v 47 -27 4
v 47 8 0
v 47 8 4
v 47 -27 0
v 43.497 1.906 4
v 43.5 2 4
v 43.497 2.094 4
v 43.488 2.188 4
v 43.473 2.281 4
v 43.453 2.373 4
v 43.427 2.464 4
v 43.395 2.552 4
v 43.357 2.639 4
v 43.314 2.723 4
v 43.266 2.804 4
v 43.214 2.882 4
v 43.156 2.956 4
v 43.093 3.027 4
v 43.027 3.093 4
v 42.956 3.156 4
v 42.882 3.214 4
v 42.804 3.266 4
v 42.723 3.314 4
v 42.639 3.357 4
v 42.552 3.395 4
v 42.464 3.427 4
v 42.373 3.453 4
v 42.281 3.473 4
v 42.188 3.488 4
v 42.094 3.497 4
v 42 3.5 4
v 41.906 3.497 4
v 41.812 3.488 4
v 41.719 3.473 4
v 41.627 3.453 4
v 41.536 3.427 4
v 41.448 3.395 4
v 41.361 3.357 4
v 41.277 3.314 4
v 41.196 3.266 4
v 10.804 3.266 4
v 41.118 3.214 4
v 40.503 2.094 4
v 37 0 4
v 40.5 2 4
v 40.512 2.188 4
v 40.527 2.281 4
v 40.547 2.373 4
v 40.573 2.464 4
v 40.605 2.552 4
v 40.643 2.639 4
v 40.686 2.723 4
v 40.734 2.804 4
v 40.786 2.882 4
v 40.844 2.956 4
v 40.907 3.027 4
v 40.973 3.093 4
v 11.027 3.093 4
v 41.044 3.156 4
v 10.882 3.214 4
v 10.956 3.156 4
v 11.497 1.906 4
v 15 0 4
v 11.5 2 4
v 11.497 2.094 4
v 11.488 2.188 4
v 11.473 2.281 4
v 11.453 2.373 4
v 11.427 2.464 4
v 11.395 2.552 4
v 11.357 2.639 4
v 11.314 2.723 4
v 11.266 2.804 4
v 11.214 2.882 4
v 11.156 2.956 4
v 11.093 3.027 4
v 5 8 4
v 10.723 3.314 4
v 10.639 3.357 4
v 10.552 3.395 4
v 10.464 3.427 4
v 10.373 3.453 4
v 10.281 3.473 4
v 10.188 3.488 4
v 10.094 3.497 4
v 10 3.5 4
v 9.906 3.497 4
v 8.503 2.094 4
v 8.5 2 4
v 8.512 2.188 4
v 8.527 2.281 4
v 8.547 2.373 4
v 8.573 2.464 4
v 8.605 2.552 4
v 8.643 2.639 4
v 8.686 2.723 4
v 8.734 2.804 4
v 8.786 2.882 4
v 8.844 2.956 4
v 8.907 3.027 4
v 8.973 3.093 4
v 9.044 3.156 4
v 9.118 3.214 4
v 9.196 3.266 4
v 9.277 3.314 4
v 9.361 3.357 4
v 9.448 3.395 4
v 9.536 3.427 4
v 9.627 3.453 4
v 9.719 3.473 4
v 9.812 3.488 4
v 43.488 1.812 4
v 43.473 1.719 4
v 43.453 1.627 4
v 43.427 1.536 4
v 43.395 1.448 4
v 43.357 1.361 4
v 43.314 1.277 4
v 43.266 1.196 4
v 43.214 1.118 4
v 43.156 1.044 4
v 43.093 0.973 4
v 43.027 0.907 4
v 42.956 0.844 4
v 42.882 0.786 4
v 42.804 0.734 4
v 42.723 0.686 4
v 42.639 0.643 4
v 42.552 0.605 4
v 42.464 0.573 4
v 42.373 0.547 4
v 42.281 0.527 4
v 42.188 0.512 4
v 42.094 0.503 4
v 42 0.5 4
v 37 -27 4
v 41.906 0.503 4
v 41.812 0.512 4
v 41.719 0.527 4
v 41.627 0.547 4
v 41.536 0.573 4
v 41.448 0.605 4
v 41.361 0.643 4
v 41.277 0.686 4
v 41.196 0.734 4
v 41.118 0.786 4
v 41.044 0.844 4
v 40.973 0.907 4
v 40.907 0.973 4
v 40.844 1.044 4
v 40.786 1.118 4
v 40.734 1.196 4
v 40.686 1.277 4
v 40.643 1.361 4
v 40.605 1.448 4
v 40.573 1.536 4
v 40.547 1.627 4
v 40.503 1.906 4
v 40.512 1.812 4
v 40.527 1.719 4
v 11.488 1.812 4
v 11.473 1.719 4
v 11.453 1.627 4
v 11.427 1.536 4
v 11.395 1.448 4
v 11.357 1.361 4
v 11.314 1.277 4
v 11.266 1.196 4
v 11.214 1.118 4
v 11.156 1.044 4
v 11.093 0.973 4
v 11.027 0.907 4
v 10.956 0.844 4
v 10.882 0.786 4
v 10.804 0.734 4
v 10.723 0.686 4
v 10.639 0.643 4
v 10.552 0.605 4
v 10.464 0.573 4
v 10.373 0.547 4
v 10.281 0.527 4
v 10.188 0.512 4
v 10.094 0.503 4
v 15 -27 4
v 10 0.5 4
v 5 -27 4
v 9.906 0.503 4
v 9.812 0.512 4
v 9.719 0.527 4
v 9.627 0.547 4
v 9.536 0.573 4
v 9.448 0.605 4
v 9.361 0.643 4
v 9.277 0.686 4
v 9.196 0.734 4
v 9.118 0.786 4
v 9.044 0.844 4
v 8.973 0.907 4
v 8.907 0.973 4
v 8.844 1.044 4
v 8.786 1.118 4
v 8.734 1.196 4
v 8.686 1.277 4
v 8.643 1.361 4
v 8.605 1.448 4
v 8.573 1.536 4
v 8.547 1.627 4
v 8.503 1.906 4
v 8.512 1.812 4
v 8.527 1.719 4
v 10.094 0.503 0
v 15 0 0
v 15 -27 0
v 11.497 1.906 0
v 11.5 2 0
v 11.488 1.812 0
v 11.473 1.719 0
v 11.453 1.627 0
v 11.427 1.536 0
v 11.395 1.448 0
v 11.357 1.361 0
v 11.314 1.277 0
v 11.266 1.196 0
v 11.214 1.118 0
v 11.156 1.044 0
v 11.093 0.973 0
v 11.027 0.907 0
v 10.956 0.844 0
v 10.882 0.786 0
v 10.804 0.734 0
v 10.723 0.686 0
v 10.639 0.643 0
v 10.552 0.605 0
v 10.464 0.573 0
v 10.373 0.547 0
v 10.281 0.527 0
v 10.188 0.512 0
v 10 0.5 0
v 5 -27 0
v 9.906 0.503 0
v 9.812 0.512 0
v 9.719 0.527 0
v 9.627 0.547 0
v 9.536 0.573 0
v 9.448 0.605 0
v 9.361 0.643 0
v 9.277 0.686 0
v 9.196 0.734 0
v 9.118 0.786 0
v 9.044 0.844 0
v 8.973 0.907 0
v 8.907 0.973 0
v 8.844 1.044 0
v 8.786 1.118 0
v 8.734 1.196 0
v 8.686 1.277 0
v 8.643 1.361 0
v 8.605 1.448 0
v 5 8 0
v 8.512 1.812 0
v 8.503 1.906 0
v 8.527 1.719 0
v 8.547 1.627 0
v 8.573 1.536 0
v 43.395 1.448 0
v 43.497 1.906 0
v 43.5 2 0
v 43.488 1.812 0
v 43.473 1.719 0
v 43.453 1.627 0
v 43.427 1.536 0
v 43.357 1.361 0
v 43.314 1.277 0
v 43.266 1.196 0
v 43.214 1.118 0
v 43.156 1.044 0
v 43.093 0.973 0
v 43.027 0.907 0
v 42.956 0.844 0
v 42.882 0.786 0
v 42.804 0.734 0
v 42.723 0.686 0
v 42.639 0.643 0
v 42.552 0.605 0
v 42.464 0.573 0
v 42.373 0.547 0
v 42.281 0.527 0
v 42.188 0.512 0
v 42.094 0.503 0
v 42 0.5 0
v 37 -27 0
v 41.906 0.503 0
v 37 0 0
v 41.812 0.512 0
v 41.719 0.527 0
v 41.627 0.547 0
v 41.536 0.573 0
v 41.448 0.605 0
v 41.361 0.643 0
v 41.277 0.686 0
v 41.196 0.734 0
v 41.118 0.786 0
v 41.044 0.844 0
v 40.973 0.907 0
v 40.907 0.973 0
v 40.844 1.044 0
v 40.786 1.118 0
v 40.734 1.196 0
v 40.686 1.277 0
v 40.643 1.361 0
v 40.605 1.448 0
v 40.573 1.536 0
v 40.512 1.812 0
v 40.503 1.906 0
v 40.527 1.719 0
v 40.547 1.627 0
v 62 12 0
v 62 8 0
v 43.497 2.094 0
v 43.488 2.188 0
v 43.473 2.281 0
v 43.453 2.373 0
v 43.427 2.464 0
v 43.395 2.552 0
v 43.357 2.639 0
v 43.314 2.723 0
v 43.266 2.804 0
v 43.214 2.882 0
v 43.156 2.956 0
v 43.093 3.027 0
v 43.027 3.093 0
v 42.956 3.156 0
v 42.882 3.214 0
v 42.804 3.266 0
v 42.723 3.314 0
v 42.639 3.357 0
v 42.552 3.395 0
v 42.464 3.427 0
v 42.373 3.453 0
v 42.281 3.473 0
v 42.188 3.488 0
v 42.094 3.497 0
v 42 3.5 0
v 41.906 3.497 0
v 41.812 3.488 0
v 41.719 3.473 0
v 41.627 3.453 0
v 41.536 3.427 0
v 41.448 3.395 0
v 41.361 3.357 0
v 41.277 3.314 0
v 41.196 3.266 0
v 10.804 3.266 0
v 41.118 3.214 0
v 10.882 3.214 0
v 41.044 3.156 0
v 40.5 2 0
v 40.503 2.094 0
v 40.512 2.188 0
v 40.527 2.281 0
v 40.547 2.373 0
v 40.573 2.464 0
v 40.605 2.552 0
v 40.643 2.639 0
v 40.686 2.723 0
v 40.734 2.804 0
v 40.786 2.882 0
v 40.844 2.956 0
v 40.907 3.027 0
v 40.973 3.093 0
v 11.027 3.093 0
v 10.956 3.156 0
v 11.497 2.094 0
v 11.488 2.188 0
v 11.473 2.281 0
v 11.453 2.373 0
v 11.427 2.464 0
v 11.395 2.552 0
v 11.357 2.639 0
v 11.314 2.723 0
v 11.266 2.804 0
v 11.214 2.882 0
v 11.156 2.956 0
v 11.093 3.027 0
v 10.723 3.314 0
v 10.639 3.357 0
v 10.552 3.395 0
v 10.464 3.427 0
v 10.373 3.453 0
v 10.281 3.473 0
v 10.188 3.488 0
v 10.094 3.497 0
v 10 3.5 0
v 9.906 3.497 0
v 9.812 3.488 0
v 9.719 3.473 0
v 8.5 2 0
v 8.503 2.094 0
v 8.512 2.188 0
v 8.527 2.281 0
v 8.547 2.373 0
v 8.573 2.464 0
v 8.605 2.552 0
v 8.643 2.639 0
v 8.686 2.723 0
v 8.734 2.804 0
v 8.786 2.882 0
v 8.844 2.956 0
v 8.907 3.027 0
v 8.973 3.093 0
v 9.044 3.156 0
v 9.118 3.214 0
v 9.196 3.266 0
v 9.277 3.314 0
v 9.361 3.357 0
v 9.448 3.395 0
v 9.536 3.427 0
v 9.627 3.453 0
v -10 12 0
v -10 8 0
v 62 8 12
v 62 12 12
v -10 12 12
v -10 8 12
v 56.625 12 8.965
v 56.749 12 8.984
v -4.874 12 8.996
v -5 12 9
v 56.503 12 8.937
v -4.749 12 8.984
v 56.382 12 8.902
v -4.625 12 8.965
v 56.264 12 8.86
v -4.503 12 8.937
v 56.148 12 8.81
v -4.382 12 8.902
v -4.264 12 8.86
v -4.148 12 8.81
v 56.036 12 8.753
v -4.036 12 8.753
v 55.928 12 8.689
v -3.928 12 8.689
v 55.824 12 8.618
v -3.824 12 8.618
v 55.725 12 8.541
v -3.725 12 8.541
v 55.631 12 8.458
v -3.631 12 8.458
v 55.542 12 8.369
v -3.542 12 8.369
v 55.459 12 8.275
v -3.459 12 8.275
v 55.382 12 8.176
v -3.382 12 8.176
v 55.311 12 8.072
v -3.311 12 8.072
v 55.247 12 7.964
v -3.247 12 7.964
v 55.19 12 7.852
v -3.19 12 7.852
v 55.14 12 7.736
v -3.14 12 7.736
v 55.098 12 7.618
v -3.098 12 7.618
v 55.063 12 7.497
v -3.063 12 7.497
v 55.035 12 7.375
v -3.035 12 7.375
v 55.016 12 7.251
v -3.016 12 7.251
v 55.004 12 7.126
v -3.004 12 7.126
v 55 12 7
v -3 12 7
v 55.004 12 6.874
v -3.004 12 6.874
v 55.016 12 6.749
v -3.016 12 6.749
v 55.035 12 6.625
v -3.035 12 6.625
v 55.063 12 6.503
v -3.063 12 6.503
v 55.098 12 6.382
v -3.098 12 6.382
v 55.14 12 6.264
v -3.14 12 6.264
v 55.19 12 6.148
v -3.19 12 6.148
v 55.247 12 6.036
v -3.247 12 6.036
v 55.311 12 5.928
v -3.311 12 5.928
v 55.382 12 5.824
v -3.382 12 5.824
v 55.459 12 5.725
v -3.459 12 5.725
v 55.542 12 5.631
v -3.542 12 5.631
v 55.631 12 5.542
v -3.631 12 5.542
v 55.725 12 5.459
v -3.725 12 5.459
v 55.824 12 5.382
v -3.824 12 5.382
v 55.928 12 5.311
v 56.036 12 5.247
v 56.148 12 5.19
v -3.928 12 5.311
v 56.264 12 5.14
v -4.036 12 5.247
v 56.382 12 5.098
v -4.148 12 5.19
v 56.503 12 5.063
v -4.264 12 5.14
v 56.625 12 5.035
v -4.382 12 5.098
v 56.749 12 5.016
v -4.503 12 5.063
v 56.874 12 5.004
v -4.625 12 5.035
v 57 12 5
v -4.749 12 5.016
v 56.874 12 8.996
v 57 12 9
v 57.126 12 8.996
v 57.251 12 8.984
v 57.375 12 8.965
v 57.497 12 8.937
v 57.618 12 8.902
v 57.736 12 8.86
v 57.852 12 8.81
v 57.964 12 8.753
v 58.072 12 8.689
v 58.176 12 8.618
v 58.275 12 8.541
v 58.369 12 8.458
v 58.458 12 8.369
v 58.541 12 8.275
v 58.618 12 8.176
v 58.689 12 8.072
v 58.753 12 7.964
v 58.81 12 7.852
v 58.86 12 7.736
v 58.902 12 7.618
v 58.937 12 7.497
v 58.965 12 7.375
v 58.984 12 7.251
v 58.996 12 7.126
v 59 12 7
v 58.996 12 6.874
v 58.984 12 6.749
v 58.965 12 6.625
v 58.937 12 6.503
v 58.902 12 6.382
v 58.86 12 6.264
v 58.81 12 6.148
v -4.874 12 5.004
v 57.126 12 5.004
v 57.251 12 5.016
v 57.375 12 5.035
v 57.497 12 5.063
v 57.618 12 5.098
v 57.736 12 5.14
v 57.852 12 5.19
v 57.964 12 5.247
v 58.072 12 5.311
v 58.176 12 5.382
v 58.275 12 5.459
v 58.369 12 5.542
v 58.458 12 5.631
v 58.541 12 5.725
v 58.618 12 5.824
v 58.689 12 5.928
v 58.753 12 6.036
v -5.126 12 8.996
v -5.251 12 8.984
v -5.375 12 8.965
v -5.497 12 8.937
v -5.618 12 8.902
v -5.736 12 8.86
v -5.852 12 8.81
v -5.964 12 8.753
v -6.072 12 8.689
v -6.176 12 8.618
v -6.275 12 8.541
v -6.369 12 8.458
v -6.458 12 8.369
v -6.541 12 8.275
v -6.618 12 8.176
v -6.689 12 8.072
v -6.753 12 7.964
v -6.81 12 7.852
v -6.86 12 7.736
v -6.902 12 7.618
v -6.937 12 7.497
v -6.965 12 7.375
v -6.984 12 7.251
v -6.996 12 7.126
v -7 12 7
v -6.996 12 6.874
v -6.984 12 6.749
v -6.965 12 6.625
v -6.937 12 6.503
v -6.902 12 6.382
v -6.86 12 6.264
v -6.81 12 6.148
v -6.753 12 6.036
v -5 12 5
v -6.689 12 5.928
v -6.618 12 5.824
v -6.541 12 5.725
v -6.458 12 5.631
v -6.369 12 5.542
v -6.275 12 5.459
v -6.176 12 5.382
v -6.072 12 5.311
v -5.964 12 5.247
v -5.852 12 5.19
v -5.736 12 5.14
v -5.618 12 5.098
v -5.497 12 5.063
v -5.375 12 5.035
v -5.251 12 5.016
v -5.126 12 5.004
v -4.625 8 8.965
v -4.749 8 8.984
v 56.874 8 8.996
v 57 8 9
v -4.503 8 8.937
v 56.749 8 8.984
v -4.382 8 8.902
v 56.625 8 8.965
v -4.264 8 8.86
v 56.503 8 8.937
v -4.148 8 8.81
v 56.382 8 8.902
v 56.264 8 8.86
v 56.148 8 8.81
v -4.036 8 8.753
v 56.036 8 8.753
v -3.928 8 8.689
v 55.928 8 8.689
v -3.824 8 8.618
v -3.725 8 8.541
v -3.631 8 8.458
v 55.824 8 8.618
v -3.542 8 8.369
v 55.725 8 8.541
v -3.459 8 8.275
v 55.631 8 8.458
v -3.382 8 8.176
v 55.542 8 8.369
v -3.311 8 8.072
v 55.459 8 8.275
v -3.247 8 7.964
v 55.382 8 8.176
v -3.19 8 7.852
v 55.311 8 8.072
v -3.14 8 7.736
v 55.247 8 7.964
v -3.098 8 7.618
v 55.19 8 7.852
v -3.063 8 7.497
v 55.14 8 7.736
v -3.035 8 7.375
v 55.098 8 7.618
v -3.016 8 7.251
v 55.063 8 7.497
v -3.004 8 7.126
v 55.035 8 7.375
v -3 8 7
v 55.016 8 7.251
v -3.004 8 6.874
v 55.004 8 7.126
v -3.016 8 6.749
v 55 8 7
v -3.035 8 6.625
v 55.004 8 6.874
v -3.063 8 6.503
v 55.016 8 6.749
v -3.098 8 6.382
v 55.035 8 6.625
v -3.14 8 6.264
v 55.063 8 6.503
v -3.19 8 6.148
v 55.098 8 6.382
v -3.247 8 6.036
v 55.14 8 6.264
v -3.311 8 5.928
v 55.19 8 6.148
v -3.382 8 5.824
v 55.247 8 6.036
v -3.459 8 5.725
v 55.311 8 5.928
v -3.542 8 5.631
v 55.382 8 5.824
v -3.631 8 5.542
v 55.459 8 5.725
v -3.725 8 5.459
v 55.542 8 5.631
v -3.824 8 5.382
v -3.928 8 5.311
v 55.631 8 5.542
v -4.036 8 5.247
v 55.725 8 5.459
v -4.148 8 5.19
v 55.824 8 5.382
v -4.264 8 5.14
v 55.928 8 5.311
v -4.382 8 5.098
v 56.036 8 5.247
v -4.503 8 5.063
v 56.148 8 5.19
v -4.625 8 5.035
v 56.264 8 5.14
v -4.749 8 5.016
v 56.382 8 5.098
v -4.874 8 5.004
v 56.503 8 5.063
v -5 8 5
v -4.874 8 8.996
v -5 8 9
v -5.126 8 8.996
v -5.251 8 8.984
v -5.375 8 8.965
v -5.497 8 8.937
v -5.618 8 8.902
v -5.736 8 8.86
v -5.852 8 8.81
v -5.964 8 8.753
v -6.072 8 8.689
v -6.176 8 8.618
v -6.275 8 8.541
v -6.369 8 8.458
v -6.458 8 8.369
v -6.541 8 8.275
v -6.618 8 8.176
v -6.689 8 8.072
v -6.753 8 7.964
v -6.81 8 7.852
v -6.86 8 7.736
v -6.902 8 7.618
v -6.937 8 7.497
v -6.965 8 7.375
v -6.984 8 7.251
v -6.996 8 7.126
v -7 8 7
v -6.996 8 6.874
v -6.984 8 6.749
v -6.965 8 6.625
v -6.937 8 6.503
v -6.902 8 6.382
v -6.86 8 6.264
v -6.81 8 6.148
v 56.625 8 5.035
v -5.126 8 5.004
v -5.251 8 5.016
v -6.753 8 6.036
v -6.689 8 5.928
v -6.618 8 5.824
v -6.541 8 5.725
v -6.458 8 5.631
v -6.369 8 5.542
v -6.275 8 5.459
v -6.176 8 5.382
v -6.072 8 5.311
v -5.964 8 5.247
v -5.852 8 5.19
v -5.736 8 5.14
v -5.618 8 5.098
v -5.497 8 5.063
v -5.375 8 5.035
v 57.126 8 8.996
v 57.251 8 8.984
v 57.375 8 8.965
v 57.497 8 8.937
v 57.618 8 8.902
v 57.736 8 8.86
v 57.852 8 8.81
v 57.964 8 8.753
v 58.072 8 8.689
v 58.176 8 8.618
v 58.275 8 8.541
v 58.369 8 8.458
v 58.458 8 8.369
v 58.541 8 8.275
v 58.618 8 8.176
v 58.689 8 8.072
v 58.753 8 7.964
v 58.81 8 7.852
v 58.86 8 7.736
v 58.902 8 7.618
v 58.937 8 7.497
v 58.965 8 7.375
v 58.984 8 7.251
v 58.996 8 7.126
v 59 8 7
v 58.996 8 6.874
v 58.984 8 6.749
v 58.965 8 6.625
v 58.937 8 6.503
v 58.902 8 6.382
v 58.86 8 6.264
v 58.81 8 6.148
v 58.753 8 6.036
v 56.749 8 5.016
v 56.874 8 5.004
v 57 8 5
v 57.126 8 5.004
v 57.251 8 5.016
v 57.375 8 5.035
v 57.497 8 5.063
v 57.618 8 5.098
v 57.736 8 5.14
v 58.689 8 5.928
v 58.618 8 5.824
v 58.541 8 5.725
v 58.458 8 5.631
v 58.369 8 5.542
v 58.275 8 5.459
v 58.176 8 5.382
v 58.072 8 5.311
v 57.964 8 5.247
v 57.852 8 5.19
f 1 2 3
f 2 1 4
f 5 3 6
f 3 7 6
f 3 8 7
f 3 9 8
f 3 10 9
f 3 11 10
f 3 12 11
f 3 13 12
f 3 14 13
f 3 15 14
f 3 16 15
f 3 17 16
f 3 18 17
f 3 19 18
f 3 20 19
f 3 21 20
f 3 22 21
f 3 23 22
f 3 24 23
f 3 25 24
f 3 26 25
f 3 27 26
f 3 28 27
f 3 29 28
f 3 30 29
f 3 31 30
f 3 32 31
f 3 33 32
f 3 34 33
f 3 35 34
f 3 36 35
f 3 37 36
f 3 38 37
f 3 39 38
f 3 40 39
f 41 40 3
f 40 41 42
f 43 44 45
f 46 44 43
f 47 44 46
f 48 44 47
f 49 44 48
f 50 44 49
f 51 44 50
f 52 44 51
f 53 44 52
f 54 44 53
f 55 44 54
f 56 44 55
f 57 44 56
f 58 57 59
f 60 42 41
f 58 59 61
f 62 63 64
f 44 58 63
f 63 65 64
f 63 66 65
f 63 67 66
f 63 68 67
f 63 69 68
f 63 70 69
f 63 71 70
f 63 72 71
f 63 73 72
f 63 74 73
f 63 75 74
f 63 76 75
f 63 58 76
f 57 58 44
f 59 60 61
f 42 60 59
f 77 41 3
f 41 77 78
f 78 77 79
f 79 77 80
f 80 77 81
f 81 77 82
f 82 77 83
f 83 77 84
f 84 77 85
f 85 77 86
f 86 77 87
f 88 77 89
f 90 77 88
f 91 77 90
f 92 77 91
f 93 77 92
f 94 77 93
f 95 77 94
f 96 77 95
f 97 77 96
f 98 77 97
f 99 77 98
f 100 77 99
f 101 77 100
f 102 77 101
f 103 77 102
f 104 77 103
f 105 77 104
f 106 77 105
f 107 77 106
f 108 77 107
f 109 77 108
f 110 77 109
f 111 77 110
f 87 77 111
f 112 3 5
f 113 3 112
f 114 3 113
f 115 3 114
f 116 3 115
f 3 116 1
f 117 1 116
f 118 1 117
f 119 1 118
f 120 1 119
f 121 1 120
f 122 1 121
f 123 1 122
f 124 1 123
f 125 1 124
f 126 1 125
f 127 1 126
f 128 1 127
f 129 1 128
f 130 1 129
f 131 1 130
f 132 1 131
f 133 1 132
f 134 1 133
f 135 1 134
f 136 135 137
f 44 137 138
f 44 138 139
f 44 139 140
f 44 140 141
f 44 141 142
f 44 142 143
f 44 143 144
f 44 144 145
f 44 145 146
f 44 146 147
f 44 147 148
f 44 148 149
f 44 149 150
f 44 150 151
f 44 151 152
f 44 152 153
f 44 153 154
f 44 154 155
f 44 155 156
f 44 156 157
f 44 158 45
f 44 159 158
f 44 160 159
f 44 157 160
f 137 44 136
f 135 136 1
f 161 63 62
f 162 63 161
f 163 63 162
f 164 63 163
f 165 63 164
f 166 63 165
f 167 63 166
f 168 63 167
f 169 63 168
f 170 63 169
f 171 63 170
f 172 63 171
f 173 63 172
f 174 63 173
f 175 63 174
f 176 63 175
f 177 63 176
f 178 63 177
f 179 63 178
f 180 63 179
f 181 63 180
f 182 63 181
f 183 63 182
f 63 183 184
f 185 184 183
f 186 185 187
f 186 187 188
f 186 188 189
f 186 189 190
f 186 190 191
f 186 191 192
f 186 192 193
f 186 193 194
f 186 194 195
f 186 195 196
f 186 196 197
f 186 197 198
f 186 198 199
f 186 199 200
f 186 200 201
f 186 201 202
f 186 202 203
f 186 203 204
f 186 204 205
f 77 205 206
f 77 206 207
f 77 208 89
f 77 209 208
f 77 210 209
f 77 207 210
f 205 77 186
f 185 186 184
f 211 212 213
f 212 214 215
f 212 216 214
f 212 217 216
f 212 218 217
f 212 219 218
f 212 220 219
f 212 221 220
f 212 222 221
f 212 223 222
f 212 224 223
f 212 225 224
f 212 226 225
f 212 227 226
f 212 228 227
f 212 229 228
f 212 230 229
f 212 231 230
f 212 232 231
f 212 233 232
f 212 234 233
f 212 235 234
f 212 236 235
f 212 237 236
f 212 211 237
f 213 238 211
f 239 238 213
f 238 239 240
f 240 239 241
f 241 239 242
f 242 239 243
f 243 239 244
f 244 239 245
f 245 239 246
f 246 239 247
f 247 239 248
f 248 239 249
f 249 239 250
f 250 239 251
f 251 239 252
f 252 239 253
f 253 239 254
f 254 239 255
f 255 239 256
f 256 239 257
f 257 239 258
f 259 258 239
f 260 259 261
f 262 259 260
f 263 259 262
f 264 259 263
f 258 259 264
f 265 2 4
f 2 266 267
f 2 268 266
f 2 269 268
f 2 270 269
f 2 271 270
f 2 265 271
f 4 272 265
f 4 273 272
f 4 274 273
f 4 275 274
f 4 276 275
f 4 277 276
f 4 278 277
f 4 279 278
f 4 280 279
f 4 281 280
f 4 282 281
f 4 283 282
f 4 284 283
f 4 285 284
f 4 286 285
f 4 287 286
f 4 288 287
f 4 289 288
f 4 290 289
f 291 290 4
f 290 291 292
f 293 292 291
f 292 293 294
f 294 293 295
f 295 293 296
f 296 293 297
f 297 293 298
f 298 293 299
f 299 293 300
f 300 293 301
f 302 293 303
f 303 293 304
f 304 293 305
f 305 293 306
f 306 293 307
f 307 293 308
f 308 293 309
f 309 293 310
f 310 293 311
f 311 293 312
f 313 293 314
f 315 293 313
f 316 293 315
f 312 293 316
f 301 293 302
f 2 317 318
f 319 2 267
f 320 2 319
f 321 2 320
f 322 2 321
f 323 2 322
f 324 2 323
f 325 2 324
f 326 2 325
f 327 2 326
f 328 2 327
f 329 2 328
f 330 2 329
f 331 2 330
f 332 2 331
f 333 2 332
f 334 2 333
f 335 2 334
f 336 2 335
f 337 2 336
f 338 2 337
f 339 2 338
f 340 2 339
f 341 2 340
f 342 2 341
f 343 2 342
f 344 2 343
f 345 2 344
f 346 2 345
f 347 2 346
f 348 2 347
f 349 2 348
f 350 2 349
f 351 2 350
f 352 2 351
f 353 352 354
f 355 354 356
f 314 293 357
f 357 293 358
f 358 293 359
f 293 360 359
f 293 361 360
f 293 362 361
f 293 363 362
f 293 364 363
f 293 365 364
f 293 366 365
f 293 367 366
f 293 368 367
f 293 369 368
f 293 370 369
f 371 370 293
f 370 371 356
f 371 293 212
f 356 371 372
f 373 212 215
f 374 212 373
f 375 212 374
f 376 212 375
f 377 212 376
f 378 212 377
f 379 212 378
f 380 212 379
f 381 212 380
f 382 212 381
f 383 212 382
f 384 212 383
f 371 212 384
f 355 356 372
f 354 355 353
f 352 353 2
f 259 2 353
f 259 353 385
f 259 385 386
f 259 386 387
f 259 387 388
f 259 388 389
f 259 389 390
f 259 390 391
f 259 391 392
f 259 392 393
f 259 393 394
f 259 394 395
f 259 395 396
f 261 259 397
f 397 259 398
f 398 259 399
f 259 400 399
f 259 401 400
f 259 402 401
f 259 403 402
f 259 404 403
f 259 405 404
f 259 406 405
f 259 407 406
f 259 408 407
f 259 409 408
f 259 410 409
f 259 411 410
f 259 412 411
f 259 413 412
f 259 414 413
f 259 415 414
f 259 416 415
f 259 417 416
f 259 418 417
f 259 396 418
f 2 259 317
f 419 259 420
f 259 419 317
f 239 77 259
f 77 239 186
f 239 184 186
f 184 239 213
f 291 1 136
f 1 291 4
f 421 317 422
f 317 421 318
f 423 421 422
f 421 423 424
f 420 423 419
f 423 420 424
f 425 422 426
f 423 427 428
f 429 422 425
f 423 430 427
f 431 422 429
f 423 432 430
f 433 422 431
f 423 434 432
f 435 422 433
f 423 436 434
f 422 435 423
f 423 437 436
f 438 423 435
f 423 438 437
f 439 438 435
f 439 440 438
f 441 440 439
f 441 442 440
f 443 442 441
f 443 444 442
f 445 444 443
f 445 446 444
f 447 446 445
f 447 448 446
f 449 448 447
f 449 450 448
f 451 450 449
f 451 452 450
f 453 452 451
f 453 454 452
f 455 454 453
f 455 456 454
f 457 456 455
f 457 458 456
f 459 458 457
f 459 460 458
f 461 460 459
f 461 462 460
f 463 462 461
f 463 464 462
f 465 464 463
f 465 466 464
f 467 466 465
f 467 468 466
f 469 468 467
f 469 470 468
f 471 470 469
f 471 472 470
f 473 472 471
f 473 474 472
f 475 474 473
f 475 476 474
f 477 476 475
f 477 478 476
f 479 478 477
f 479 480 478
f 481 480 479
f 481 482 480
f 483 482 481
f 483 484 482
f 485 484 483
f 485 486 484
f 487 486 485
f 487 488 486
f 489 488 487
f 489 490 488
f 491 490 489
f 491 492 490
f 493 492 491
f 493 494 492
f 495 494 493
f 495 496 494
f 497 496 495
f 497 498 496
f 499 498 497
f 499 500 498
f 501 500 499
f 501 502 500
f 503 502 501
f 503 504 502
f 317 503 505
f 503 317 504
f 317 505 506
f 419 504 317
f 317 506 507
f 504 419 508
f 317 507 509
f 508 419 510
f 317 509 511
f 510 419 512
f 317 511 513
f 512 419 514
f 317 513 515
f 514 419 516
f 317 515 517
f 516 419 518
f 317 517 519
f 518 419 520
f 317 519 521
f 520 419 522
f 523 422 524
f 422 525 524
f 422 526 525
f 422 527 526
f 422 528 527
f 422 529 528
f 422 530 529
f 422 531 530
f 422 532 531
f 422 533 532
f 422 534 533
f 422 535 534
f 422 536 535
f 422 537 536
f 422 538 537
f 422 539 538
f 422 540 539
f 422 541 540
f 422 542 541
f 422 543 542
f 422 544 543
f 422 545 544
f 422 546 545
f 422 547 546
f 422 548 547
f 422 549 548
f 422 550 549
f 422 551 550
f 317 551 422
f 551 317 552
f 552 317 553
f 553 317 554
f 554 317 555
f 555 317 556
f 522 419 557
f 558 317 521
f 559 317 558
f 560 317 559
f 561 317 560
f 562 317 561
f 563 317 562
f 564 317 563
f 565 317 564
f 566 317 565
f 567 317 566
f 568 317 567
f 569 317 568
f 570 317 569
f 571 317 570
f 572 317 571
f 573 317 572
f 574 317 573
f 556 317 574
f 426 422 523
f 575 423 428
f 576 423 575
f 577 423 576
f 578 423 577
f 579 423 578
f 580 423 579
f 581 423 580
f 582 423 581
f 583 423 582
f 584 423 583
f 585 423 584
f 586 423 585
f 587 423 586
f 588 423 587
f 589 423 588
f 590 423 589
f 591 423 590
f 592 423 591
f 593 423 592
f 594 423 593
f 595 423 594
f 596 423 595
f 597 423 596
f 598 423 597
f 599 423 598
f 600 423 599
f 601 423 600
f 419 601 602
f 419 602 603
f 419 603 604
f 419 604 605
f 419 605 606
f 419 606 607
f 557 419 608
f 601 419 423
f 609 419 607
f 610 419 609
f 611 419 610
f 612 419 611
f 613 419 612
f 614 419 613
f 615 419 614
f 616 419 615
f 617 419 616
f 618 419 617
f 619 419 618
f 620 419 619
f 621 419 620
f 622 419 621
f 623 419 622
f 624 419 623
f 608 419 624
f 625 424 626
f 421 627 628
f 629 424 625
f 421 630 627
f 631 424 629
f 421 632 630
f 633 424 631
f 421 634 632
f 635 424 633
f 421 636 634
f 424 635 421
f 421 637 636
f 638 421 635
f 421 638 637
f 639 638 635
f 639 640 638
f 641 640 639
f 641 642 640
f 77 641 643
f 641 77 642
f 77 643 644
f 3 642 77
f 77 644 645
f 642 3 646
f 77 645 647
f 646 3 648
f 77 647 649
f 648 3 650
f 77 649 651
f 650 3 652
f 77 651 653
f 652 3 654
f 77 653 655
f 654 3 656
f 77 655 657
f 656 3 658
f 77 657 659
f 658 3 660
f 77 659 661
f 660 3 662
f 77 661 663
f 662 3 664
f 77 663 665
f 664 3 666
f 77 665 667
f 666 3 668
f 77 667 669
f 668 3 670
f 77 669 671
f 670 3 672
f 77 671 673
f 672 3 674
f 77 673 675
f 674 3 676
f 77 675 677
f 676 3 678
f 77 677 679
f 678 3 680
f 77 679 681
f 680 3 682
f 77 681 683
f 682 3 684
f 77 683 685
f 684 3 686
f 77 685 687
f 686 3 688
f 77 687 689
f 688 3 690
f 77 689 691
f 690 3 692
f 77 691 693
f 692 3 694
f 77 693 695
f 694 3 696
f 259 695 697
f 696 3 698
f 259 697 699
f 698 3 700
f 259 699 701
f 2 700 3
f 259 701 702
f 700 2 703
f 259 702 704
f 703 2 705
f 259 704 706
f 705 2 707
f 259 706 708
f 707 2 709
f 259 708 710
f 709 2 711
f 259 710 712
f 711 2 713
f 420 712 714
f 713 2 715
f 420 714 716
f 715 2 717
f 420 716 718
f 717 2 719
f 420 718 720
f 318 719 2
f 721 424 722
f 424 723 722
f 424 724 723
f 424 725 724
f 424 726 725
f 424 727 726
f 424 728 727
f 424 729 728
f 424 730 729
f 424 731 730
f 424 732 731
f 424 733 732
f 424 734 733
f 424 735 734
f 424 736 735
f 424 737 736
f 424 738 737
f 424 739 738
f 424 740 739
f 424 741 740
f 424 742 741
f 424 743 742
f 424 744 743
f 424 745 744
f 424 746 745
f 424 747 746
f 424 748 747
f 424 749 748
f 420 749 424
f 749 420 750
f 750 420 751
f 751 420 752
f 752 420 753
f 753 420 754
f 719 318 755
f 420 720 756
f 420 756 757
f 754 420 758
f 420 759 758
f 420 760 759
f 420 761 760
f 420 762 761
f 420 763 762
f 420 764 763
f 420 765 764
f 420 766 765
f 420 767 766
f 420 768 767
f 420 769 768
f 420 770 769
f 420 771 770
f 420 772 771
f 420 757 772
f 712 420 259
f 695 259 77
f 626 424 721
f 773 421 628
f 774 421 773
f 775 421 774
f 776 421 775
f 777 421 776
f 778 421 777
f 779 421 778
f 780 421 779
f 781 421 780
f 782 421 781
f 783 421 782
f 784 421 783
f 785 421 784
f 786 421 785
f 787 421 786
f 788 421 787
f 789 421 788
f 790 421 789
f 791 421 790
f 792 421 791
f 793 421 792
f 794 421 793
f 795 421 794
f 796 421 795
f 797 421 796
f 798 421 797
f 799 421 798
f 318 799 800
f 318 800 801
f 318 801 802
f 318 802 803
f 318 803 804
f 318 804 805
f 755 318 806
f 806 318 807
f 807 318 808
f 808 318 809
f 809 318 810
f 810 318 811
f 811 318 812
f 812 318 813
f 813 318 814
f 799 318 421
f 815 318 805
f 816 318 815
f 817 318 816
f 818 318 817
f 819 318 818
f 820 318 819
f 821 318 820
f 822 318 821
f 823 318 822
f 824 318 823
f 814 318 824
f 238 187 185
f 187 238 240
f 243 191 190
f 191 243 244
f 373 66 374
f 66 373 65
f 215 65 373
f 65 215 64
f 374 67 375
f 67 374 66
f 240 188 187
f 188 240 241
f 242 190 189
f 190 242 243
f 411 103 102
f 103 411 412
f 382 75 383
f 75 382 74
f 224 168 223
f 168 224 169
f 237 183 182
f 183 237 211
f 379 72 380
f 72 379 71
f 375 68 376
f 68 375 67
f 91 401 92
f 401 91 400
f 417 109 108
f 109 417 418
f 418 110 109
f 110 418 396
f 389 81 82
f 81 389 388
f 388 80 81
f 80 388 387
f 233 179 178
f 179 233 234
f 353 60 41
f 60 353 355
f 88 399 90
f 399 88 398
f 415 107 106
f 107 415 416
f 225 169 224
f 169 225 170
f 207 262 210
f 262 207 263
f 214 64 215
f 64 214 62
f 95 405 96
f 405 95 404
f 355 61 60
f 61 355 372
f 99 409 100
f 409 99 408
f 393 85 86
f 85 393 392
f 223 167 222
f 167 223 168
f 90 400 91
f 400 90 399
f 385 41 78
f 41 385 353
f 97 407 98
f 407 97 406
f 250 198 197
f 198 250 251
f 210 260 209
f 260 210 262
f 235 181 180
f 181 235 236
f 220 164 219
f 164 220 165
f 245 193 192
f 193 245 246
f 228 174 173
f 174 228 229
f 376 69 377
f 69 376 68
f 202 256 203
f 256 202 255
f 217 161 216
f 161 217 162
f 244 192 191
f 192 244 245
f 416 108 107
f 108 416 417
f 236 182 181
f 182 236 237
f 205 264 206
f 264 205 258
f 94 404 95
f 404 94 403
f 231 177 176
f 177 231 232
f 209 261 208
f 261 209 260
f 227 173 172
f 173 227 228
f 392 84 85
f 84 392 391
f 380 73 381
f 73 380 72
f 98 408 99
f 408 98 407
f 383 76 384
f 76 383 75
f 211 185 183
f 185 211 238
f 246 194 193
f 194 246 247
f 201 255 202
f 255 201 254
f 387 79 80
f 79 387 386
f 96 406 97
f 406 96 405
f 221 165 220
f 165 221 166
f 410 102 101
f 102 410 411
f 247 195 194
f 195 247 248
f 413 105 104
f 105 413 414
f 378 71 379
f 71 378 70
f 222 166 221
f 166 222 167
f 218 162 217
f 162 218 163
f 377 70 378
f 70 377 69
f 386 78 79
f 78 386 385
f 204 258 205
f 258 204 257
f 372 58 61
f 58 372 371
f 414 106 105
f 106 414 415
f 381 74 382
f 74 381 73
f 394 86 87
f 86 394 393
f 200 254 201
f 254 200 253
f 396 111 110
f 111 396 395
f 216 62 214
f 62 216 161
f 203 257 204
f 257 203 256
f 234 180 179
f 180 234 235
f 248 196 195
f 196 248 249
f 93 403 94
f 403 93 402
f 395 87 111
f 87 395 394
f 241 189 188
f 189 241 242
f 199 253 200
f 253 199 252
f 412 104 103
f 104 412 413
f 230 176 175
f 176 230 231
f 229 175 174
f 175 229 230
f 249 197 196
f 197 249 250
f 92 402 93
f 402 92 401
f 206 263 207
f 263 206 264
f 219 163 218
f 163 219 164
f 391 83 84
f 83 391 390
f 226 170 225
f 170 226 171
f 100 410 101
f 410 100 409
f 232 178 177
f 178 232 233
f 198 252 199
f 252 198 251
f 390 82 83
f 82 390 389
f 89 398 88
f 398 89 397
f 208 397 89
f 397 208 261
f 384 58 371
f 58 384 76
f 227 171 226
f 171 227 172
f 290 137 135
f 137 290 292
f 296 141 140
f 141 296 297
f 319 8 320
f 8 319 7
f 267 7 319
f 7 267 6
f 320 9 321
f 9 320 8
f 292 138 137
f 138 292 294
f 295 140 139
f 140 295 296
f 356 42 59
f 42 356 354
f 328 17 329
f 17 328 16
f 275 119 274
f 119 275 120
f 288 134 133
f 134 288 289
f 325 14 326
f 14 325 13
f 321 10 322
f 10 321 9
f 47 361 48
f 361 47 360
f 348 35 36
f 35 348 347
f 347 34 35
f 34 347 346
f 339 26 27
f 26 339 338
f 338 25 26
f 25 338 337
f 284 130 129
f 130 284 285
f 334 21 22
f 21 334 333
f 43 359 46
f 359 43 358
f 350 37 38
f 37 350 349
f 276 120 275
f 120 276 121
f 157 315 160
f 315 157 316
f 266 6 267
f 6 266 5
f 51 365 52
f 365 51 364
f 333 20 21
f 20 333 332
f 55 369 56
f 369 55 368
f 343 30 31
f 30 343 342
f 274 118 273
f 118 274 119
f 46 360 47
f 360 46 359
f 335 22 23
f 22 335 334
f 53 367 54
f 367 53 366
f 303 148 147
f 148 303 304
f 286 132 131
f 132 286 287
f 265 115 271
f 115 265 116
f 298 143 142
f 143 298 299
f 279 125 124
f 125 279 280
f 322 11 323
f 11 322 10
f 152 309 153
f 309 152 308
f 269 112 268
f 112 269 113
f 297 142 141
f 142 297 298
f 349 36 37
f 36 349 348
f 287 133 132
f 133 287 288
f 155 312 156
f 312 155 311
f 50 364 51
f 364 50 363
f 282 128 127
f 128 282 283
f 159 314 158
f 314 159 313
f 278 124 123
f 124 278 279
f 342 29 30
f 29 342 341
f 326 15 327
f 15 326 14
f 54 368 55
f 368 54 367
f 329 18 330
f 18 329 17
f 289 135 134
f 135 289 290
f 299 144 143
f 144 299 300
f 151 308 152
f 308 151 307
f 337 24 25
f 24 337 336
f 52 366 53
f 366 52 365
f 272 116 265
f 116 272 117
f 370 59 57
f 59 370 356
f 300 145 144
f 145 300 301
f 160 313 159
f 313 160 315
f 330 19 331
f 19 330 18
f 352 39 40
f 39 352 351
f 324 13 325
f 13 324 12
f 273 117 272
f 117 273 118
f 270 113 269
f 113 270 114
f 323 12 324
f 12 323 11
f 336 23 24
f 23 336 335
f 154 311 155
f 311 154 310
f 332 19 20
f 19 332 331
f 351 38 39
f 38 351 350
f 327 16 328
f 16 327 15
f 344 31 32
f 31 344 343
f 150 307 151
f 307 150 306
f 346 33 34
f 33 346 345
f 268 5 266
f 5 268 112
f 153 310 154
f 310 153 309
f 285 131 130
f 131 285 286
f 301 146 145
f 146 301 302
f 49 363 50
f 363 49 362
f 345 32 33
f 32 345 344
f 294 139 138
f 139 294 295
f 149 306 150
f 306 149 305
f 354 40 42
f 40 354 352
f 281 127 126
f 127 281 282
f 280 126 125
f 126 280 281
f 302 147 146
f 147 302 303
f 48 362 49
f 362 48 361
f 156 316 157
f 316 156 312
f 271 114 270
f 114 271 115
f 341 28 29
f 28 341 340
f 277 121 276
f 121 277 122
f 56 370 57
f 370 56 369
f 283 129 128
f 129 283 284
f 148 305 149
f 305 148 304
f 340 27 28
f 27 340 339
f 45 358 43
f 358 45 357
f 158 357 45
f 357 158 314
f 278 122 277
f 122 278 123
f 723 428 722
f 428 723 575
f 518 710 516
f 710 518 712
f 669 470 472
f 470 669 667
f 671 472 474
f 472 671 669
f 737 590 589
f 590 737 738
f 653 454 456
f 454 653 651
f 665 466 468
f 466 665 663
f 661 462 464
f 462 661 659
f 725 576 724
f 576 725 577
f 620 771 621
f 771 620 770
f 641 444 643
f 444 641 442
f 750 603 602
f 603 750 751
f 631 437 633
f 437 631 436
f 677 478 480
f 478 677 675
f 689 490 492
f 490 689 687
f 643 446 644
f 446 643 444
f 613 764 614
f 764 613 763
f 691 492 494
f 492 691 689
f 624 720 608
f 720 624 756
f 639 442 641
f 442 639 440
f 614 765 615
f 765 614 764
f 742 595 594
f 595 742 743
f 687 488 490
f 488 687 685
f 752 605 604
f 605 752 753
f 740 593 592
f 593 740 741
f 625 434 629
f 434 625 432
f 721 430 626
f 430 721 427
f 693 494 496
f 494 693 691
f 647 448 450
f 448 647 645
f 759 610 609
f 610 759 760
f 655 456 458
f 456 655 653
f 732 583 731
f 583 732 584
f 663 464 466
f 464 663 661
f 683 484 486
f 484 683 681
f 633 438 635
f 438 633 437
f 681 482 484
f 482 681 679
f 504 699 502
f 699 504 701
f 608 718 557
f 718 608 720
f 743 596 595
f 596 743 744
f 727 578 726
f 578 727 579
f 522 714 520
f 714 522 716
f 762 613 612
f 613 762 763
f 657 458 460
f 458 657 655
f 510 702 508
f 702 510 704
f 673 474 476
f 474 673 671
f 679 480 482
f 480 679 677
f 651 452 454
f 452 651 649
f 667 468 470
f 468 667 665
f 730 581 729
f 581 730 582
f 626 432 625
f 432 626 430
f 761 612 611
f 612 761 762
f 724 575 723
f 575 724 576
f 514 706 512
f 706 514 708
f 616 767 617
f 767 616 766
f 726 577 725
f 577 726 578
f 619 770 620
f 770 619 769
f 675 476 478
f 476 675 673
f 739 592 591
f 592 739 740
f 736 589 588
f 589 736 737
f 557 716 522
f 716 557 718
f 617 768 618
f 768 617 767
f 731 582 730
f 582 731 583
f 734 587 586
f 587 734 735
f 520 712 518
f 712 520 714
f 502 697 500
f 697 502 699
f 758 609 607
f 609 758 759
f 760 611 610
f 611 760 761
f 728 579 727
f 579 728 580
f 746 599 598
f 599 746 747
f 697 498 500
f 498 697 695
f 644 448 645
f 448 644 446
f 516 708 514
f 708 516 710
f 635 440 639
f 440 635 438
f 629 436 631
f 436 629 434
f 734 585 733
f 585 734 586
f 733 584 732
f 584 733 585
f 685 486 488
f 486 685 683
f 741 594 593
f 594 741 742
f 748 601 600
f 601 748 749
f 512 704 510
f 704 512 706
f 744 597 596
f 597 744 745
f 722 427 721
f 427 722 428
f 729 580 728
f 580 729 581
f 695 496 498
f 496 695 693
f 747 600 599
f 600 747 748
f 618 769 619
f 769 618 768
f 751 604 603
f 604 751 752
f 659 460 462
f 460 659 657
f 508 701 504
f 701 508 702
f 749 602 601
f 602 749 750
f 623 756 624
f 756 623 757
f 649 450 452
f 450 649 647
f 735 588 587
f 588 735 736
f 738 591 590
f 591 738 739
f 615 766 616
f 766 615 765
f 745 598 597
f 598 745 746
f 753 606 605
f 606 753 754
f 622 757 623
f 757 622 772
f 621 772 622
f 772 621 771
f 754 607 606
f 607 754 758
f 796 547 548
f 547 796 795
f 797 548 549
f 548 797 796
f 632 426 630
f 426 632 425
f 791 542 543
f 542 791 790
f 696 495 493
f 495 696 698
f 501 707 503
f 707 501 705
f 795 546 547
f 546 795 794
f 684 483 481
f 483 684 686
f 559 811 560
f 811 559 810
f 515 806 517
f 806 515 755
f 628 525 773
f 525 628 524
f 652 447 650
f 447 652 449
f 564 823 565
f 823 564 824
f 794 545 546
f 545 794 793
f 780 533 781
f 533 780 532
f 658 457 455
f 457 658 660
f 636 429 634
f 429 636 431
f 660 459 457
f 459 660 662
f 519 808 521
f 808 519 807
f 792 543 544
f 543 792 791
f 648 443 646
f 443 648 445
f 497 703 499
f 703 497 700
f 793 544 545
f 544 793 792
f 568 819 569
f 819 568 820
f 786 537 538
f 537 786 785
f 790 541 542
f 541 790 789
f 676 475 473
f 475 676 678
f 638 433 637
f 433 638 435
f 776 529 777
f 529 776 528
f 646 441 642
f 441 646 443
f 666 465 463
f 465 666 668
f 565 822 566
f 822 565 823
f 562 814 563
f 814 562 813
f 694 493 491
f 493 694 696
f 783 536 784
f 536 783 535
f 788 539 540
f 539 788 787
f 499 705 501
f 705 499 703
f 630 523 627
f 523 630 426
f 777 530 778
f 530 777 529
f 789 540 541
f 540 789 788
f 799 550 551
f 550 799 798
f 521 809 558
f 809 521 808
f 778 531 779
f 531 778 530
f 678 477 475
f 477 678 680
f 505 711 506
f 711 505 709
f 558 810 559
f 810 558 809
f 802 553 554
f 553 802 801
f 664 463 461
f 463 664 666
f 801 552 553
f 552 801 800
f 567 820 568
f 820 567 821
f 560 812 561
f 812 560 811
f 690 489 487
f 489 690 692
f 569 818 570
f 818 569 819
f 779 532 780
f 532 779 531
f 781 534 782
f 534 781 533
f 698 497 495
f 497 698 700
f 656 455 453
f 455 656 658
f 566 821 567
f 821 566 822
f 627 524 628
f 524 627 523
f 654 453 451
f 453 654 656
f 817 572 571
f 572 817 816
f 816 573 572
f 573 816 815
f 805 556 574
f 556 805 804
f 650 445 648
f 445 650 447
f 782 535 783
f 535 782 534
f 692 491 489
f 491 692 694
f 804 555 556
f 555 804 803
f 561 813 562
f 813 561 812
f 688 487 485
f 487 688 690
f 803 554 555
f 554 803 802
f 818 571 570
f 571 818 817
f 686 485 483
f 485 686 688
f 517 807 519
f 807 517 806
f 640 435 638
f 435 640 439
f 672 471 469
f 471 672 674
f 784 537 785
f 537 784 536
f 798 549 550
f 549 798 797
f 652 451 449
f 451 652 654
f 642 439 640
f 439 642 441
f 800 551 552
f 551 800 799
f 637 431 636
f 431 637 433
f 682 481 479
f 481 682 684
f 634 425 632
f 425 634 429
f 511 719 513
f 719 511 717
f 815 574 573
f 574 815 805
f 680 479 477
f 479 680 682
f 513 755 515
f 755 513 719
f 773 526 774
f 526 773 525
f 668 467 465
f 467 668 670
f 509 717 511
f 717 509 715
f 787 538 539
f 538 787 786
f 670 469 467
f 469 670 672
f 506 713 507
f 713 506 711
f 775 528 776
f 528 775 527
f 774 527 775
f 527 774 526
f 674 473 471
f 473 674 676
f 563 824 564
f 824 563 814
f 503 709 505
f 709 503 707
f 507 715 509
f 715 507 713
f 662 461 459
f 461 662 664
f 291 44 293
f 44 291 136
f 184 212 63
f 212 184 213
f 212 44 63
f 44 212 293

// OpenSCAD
difference(){
	union(){



        translate([5,-2-25,0]){
           cube([42,12+25,4], center=false);
        }        
        translate([-10,8,0]){
           cube([72,4,12], center=false);
        }        
             




        
	}
	union() {
        translate([10,2,-1]){
            rotate([0,0,0]){
               cylinder(h=999, r=1.5, $fn=100, center=false);
            }
        }
        translate([42,2,-1]){
            rotate([0,0,0]){
               cylinder(h=999, r=1.5, $fn=100, center=false);
            }
        }

        translate([-5,20,7]){
            rotate([90,0,0]){
               cylinder(h=999, r=2, $fn=100, center=false);
            }
        }
        translate([57,20,7]){
            rotate([90,0,0]){
               cylinder(h=999, r=2, $fn=100, center=false);
            }
        }

        translate([15,-7-20-10,-1]){
           cube([52-30,17+20,6], center=false);
        }  


	}
}
